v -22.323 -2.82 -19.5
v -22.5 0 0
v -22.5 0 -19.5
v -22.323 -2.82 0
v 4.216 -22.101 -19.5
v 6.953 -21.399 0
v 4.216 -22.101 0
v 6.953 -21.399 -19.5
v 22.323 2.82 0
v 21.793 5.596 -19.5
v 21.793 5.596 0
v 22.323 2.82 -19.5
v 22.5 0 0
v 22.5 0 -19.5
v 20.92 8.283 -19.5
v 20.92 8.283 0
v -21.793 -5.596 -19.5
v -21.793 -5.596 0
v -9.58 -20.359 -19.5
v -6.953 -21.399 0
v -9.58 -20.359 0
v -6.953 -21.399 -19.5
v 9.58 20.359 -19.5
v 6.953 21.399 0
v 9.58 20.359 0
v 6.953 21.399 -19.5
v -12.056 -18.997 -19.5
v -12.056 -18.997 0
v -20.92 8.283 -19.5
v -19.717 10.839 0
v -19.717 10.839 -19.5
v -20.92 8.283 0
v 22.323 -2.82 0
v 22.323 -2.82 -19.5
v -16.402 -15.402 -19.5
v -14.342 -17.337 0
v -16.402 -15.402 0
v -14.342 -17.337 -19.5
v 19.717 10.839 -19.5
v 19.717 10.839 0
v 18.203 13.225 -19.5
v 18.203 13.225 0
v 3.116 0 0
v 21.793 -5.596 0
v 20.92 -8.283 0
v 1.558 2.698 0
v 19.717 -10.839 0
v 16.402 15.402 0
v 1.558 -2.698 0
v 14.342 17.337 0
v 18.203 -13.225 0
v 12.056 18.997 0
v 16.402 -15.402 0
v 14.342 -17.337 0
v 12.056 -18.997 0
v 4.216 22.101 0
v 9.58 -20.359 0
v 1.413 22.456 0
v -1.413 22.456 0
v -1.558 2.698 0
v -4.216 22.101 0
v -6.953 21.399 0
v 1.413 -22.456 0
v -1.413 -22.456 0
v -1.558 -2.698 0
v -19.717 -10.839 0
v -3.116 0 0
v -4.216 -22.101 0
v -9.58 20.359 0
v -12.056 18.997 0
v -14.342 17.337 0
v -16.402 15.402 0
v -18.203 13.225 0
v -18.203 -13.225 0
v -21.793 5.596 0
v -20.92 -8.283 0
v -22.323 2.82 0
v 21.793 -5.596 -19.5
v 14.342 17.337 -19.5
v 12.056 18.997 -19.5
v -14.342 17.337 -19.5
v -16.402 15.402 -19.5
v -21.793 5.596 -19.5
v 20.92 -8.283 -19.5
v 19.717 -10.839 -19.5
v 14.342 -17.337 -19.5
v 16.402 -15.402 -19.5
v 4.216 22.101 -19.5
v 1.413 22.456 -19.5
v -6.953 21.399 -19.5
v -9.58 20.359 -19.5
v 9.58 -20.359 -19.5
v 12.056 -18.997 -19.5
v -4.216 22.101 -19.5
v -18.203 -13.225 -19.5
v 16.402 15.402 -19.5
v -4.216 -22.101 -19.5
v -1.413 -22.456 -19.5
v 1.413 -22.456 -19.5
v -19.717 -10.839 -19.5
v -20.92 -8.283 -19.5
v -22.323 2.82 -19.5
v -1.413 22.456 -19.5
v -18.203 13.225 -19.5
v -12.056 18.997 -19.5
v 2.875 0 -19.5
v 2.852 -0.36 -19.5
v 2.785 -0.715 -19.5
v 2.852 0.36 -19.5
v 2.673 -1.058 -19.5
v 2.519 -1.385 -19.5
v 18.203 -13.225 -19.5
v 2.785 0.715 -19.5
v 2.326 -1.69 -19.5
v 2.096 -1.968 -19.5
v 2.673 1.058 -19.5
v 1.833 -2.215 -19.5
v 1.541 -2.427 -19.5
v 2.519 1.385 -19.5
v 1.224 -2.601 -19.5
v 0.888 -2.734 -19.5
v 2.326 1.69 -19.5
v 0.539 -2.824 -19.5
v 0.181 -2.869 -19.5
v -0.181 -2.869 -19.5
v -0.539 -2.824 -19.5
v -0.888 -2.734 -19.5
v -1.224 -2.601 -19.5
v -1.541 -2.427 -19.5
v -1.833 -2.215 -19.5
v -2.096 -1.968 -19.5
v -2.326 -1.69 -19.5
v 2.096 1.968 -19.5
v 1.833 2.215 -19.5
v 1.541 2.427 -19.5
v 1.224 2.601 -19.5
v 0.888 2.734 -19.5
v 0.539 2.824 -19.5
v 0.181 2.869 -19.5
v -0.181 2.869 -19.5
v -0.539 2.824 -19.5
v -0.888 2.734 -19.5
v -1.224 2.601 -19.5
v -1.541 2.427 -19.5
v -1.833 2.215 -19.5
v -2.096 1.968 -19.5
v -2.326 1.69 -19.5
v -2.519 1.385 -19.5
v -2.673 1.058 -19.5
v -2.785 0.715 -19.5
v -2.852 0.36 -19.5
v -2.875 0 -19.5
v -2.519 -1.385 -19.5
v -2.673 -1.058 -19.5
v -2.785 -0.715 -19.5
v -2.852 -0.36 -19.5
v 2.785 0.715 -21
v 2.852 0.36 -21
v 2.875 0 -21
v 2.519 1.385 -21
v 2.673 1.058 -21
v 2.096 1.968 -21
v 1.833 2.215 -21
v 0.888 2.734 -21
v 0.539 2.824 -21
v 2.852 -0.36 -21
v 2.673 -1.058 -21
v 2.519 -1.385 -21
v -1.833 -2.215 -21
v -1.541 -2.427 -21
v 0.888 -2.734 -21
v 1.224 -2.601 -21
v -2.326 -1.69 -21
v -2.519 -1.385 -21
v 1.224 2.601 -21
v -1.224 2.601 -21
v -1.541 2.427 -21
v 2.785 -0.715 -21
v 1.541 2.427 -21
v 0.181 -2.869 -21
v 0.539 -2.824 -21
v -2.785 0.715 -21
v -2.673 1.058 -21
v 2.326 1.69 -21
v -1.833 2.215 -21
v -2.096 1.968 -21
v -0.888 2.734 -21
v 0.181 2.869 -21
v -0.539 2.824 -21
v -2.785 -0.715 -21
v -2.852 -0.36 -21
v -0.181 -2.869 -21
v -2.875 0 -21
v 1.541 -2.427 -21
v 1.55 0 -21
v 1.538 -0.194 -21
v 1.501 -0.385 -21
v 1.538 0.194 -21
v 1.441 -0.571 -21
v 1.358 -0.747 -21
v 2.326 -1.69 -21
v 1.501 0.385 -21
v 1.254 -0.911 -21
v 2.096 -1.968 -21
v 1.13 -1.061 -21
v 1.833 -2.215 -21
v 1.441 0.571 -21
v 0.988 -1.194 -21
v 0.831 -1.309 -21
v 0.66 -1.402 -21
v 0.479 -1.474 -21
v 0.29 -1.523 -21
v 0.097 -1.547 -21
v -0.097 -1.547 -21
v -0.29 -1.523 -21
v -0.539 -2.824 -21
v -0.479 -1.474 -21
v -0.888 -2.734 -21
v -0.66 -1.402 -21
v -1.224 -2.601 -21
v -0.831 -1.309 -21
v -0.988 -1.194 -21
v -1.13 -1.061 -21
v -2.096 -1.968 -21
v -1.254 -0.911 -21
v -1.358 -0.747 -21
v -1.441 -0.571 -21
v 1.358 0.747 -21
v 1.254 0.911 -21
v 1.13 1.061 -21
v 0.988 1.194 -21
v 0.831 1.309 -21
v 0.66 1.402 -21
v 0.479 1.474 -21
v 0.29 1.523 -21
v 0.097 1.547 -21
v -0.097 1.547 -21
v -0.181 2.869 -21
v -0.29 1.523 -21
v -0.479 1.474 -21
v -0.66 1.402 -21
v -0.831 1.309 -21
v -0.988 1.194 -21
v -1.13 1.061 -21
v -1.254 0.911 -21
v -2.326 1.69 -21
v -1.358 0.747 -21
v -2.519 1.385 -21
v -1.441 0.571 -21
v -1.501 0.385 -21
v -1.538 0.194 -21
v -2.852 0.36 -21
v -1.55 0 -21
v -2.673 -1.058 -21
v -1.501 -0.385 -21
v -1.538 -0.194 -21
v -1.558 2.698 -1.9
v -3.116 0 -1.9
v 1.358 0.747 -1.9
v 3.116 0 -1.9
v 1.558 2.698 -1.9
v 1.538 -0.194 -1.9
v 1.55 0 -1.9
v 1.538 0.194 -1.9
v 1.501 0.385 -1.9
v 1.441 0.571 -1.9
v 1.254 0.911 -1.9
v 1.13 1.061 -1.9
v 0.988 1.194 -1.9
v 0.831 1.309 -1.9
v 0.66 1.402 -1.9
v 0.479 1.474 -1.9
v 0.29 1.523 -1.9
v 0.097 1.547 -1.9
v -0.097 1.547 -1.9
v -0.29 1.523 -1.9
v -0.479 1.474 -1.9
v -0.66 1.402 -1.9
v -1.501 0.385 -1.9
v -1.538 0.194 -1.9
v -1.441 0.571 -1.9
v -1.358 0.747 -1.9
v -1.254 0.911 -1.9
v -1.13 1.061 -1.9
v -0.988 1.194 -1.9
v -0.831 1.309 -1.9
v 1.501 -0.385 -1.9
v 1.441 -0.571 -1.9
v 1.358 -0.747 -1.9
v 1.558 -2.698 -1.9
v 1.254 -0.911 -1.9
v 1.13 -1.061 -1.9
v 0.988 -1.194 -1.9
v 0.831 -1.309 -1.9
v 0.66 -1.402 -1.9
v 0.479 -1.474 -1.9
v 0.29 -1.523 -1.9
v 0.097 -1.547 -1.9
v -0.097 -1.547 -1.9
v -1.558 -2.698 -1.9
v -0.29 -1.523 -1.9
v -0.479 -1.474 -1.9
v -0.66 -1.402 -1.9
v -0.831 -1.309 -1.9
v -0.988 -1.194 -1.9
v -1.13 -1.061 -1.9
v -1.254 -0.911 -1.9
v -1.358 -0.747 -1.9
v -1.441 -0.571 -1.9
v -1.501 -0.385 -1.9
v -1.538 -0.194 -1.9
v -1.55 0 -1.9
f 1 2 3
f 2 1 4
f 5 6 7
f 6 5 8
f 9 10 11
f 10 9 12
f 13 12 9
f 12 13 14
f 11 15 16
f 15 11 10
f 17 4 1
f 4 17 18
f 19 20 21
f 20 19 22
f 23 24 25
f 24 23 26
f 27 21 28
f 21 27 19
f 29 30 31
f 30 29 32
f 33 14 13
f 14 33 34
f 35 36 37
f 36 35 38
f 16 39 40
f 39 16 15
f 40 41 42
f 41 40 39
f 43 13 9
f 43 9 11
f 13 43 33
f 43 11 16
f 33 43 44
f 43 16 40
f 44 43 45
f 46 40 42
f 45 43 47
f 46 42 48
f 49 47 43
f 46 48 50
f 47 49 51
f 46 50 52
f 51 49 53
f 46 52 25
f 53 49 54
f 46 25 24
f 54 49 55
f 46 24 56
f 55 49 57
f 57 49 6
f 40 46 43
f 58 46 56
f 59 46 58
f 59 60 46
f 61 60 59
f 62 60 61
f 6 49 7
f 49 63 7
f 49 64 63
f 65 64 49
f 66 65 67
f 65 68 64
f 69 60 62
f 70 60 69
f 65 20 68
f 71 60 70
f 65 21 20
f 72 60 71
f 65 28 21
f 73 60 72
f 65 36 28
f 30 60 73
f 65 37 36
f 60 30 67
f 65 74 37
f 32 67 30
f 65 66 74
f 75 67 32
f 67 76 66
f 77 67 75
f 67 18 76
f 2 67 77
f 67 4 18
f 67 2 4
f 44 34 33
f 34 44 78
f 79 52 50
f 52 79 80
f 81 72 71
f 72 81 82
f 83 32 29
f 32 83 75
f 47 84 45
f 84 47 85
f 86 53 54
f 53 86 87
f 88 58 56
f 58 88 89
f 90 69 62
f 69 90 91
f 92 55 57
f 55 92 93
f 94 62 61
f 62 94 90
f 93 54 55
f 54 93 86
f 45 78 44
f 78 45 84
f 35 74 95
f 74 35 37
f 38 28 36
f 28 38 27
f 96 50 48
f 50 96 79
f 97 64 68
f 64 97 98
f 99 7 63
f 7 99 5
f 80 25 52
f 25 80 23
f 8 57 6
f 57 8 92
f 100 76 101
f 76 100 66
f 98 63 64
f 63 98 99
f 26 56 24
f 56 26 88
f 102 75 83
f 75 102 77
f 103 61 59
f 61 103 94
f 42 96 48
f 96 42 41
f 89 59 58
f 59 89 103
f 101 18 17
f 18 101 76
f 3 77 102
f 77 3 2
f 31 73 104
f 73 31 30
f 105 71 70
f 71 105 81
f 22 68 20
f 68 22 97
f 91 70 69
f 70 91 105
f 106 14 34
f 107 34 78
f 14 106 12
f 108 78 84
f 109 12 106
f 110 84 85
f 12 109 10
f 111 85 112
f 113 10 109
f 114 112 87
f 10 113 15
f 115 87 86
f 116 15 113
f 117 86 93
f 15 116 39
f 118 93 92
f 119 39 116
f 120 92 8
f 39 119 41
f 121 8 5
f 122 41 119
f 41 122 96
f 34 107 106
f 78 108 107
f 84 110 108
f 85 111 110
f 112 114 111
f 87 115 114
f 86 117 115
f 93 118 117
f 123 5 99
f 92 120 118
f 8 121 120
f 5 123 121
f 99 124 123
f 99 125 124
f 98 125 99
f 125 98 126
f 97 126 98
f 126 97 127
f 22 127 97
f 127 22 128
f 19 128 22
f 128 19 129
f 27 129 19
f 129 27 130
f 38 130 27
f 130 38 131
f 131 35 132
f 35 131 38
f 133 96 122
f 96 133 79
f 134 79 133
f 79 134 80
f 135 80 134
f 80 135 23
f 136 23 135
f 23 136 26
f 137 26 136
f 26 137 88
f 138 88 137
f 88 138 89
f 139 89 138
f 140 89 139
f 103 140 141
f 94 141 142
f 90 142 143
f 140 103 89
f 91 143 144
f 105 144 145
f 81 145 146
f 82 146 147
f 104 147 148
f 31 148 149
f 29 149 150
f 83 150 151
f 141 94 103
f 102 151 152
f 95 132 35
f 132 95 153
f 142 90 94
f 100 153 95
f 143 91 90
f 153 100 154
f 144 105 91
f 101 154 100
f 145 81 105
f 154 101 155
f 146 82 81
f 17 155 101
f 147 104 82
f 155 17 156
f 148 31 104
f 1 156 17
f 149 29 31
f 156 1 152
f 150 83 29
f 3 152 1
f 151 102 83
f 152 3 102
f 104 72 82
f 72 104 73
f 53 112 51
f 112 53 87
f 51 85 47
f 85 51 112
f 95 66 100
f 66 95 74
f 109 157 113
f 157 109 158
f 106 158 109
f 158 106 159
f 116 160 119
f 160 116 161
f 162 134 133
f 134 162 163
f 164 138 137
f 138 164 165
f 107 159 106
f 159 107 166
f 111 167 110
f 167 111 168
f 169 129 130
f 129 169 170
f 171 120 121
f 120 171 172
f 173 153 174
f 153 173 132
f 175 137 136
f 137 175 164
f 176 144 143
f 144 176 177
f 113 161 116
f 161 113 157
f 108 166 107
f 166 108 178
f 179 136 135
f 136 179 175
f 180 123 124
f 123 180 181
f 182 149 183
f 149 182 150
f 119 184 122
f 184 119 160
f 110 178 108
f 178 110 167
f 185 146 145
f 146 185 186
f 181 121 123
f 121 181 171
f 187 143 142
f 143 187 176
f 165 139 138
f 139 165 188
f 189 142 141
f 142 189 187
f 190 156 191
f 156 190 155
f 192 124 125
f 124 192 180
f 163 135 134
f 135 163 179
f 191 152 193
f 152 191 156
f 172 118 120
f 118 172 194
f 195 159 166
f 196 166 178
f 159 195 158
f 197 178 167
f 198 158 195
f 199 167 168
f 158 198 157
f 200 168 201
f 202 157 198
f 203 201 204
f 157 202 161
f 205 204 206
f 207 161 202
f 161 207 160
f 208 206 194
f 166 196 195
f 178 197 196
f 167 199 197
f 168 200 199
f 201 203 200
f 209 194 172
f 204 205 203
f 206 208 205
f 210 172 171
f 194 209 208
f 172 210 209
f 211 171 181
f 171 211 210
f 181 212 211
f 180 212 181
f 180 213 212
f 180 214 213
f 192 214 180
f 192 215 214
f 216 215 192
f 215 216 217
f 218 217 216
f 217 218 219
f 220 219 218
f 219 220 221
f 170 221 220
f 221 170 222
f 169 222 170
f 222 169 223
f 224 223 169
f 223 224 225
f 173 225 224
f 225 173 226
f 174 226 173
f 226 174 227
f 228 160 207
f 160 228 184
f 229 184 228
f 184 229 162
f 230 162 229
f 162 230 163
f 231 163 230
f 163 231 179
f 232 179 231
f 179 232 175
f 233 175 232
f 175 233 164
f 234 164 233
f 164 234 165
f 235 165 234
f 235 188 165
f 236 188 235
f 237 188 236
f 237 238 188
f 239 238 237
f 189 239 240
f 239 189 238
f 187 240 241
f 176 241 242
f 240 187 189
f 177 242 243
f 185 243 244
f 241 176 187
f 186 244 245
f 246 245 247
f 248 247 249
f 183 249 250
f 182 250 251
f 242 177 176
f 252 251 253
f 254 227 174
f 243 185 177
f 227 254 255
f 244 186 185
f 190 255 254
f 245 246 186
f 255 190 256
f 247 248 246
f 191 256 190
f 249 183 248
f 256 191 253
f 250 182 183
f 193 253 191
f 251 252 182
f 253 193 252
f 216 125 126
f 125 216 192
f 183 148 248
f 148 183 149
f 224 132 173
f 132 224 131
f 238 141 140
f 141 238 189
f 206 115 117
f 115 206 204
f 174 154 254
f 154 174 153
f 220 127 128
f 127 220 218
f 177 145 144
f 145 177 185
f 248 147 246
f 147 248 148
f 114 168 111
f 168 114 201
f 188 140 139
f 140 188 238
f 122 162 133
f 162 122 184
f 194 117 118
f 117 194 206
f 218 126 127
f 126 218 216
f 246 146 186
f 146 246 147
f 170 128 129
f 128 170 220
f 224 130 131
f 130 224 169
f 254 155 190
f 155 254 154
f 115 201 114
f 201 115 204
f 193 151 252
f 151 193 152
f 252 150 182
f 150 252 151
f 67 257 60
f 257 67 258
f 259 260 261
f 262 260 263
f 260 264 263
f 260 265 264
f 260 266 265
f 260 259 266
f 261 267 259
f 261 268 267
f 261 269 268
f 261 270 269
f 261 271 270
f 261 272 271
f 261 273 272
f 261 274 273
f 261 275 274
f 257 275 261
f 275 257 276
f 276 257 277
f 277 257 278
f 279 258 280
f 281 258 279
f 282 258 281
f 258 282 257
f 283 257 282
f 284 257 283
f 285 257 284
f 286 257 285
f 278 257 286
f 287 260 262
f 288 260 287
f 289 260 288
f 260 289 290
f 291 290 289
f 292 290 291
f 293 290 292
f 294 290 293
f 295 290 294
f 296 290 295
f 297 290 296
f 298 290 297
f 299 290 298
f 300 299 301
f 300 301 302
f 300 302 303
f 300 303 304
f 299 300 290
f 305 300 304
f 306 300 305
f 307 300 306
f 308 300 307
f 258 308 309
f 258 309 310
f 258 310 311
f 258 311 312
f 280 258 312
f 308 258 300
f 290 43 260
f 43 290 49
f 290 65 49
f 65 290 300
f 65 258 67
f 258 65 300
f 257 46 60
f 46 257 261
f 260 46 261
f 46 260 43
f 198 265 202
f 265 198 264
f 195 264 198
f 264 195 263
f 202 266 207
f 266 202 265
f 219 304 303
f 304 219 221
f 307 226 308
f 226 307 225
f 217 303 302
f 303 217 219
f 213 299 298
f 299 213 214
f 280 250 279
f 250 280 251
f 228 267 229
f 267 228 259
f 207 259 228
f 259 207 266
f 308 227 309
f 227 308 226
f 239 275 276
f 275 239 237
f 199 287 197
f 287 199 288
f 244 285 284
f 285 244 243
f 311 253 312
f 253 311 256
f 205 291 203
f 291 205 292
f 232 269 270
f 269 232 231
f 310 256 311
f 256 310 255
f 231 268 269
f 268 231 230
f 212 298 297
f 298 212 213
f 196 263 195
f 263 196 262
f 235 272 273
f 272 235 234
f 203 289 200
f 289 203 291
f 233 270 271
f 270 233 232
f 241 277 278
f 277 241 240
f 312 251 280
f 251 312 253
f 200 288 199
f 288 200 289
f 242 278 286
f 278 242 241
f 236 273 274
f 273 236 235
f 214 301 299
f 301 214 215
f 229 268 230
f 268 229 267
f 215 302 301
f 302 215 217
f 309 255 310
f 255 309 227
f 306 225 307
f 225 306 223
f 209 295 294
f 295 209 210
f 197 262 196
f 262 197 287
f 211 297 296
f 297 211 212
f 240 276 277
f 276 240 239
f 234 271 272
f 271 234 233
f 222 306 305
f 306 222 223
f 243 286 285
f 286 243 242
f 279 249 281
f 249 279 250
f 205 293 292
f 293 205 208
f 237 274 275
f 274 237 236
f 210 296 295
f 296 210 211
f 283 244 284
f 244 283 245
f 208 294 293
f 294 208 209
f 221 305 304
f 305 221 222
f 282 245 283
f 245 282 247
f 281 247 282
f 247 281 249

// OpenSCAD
$fn = 50;

difference() {
	union() {
		translate(v = [0, 0, -19.5]) {
			cylinder(h = 19.5, r = 22.5);
		}
		#translate(v = [0, 0, -21.0]) {
			cylinder(h = 21, r = 2.875);
		}
	}
	union() {
		translate(v = [0, 0, 0]) {
			rotate(a = [0, 0, 0]) {
				difference() {
					union() {
						translate(v = [0, 0, -1.9]) {
							linear_extrude(height = 1.9) {
								polygon(points = [[3.1158, 0.0], [1.5579000000000005, 2.698361953111554], [-1.5578999999999994, 2.6983619531115544], [-3.1158, 3.815754496783323e-16], [-1.5579000000000014, -2.6983619531115535], [1.557899999999998, -2.6983619531115552]]);
							}
						}
					}
					union();
				}
			}
		}
		#translate(v = [0, 0, -100.0]) {
			cylinder(h = 200, r = 1.55);
		}
	}
}
